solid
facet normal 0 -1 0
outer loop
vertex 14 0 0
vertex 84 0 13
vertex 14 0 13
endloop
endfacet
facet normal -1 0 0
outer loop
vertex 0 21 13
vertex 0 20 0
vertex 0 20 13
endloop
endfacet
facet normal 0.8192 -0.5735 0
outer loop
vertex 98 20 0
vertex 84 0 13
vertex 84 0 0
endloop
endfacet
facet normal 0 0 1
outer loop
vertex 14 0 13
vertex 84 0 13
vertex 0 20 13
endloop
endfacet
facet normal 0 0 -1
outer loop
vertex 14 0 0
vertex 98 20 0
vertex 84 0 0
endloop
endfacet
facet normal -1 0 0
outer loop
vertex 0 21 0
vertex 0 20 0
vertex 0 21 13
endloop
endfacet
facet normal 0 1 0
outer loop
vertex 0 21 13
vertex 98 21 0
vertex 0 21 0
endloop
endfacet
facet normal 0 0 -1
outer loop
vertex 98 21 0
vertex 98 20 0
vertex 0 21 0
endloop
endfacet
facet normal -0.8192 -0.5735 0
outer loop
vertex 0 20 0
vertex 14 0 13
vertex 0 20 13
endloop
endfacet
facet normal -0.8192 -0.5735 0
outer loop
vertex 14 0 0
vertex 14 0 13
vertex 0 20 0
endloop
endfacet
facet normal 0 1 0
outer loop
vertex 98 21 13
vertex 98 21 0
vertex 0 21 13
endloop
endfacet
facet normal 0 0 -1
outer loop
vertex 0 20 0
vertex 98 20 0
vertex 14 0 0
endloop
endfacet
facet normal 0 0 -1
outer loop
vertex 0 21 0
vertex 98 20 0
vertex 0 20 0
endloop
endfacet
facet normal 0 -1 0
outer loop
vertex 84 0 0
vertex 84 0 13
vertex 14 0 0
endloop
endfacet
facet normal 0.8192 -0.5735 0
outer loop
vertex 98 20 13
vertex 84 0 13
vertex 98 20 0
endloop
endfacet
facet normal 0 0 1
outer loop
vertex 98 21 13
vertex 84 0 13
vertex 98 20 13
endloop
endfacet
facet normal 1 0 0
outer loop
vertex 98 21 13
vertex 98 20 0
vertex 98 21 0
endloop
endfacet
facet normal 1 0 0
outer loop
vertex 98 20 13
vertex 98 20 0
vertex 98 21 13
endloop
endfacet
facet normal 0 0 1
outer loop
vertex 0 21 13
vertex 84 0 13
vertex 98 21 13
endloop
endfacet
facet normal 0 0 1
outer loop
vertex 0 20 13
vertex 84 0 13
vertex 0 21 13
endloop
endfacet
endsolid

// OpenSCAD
module cableGuide()
{
  hull()
  {
    // upper baund
    translate([0, 20, 0])
      cube([98, 1, 6+7]);
    // lower baund
    translate([(98-70)/2, 0, 0])
      cube([70, 1, 6+7]);
  }
}

cableGuide();
